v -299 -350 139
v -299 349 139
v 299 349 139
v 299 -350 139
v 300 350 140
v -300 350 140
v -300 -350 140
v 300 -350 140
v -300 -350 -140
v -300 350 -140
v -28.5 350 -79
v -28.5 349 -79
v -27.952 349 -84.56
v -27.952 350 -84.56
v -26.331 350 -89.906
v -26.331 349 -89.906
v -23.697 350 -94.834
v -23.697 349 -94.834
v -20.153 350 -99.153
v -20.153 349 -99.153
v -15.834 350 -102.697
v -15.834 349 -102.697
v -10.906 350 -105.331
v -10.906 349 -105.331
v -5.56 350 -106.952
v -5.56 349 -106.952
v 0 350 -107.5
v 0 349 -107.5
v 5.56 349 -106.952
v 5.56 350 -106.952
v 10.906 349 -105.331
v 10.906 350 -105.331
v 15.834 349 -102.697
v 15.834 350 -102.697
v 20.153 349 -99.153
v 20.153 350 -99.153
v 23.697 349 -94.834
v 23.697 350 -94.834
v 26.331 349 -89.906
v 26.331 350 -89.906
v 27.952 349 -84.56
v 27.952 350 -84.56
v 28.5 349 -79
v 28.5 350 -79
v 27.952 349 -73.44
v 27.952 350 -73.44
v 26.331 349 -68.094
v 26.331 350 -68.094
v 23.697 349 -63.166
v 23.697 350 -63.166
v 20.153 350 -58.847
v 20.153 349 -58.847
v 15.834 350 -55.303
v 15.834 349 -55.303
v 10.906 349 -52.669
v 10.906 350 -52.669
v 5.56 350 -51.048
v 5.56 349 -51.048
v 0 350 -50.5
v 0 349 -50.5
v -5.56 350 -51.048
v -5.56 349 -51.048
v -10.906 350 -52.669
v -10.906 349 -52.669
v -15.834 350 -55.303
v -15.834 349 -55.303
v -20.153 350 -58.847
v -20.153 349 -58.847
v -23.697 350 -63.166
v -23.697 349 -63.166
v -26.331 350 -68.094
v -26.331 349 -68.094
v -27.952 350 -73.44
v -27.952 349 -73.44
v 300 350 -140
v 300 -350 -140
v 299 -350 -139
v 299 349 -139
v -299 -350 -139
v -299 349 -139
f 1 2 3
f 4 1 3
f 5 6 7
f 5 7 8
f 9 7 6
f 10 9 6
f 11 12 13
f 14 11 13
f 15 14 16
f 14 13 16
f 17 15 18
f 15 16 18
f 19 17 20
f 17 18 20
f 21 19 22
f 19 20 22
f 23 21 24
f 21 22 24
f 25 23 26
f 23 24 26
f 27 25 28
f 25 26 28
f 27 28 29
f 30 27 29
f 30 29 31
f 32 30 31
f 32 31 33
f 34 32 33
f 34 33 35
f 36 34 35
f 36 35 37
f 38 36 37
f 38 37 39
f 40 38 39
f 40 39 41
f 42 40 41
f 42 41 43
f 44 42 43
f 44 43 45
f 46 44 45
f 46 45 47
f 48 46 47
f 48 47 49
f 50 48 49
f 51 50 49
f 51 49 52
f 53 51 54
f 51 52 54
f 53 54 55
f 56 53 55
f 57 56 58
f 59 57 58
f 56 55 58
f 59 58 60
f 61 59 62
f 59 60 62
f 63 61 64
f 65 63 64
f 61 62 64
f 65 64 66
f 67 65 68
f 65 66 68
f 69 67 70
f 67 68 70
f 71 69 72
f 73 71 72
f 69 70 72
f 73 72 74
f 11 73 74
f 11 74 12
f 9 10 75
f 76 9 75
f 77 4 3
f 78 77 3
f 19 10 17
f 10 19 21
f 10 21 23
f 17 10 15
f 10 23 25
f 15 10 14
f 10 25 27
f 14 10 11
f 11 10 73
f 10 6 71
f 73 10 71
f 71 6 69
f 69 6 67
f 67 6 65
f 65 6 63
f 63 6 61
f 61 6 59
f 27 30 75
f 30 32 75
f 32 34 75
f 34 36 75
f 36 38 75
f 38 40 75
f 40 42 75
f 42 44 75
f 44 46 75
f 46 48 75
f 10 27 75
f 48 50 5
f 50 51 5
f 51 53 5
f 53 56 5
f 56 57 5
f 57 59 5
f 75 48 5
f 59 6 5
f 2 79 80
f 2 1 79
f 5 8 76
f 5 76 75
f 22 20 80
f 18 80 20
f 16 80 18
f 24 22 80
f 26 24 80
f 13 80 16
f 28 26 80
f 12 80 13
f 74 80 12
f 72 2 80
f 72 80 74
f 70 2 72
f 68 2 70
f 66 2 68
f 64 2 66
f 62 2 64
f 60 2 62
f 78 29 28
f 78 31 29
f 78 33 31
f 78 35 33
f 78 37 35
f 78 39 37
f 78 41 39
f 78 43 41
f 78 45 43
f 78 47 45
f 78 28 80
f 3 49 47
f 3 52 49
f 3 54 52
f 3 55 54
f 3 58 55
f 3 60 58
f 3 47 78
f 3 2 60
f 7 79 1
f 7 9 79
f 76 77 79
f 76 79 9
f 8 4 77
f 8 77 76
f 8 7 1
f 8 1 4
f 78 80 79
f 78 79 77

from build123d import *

# Parameters (mm, degrees)
SKETCH_1_W      = 600
SKETCH_1_H      = 700
EXTRUDE_1_DEPTH = 140
SHELL_1_T       = -1
HOLE_WIZARD_1_D = 57


with BuildPart() as part:
    # 草图1 → 凸台-拉伸1 (new, symmetric)
    with BuildSketch(Plane.XY):
        Rectangle(SKETCH_1_W, SKETCH_1_H)
    extrude(amount=EXTRUDE_1_DEPTH, both=True)

    # 抽壳1
    shell_1_openings = [part.faces().sort_by_distance(p)[0] for p in [
        (0, -350, 0),
    ]]
    offset(amount=SHELL_1_T, openings=shell_1_openings, kind=Kind.INTERSECTION)

    # 孔1 (through all)
    with Locations(Plane(origin=(0, 350, 0), x_dir=(1, 0, 0), z_dir=(0, 1, 0))):
        with Locations((0, 79)):
            Hole(HOLE_WIZARD_1_D / 2)


solid = part.part
